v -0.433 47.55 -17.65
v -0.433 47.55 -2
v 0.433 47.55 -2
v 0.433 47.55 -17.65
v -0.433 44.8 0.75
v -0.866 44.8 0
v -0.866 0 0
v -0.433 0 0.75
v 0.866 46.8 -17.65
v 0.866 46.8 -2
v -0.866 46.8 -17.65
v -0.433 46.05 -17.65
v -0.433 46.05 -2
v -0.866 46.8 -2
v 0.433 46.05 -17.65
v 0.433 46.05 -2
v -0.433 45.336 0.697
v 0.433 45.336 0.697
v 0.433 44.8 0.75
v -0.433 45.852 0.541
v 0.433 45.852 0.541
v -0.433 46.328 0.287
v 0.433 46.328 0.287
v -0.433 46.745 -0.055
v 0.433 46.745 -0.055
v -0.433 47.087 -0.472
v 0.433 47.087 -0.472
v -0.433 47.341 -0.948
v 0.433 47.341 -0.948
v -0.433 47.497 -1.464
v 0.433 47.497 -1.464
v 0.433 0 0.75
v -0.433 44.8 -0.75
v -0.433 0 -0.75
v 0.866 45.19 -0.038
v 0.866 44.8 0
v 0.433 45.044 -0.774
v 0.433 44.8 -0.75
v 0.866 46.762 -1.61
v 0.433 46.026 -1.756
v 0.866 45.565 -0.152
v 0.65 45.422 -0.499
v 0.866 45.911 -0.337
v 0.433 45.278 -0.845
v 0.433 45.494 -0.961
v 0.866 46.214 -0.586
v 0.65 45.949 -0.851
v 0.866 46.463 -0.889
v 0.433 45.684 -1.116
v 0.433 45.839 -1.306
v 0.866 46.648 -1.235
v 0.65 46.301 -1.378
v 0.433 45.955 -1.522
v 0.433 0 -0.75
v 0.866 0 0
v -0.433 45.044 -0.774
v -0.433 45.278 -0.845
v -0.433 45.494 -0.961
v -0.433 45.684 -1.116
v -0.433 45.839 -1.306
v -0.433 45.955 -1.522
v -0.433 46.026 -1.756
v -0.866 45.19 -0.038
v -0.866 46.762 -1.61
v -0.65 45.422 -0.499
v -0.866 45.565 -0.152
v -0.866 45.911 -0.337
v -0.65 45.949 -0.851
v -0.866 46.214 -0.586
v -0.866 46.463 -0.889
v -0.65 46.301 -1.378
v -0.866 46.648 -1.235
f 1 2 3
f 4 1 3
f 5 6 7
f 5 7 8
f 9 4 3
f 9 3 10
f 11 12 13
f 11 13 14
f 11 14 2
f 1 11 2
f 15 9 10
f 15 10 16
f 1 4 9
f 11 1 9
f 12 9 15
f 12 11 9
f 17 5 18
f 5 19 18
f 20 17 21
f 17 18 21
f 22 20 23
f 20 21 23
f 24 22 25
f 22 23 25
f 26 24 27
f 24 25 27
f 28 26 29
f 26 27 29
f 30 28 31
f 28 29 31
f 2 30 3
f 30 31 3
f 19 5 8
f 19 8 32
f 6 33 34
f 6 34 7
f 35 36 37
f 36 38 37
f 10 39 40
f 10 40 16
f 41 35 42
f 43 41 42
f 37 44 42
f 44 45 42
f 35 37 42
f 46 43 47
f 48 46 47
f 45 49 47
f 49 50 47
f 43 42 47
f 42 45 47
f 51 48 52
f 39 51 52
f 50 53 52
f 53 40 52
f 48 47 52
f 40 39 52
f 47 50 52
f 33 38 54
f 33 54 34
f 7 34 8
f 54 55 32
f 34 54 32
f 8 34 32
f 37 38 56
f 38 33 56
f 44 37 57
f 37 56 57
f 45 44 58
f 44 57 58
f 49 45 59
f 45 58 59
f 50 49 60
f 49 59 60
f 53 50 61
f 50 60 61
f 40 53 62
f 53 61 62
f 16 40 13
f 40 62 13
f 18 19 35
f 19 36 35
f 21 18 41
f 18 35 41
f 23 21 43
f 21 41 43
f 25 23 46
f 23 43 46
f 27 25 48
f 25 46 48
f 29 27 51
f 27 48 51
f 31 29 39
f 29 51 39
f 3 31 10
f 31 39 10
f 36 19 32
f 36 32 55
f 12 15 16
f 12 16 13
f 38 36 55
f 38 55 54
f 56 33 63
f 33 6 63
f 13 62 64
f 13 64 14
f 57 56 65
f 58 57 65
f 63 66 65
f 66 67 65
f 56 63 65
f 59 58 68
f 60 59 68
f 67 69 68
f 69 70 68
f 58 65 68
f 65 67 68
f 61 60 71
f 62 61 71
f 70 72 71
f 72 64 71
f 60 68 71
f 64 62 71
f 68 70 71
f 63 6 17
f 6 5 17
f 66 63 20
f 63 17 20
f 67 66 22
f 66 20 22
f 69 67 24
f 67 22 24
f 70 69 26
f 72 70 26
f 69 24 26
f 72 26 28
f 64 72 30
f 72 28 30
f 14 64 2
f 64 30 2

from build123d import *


with BuildPart() as part:
    # Sweep1: sweep along a path in Sketch2
    with BuildLine(Plane.ZY) as sweep1_path:
        Line((0, 0), (0, 44.8))
        ThreePointArc((0, 44.8), (-0.585786438, 46.214213562), (-2, 46.8))
        Line((-2, 46.8), (-17.65, 46.8))
    # Sketch1 → Sweep1 (sweep)
    with BuildSketch(Plane(origin=(0, 0, 0), x_dir=(1, 0, 0), z_dir=(0, 1, 0))):
        Polygon((0.866025404, 0), (0.433012702, 0.75), (-0.433012702, 0.75), (-0.866025404, 0), (-0.433012702, -0.75), (0.433012702, -0.75), align=None)
    sweep(path=sweep1_path.line)


solid = part.part
